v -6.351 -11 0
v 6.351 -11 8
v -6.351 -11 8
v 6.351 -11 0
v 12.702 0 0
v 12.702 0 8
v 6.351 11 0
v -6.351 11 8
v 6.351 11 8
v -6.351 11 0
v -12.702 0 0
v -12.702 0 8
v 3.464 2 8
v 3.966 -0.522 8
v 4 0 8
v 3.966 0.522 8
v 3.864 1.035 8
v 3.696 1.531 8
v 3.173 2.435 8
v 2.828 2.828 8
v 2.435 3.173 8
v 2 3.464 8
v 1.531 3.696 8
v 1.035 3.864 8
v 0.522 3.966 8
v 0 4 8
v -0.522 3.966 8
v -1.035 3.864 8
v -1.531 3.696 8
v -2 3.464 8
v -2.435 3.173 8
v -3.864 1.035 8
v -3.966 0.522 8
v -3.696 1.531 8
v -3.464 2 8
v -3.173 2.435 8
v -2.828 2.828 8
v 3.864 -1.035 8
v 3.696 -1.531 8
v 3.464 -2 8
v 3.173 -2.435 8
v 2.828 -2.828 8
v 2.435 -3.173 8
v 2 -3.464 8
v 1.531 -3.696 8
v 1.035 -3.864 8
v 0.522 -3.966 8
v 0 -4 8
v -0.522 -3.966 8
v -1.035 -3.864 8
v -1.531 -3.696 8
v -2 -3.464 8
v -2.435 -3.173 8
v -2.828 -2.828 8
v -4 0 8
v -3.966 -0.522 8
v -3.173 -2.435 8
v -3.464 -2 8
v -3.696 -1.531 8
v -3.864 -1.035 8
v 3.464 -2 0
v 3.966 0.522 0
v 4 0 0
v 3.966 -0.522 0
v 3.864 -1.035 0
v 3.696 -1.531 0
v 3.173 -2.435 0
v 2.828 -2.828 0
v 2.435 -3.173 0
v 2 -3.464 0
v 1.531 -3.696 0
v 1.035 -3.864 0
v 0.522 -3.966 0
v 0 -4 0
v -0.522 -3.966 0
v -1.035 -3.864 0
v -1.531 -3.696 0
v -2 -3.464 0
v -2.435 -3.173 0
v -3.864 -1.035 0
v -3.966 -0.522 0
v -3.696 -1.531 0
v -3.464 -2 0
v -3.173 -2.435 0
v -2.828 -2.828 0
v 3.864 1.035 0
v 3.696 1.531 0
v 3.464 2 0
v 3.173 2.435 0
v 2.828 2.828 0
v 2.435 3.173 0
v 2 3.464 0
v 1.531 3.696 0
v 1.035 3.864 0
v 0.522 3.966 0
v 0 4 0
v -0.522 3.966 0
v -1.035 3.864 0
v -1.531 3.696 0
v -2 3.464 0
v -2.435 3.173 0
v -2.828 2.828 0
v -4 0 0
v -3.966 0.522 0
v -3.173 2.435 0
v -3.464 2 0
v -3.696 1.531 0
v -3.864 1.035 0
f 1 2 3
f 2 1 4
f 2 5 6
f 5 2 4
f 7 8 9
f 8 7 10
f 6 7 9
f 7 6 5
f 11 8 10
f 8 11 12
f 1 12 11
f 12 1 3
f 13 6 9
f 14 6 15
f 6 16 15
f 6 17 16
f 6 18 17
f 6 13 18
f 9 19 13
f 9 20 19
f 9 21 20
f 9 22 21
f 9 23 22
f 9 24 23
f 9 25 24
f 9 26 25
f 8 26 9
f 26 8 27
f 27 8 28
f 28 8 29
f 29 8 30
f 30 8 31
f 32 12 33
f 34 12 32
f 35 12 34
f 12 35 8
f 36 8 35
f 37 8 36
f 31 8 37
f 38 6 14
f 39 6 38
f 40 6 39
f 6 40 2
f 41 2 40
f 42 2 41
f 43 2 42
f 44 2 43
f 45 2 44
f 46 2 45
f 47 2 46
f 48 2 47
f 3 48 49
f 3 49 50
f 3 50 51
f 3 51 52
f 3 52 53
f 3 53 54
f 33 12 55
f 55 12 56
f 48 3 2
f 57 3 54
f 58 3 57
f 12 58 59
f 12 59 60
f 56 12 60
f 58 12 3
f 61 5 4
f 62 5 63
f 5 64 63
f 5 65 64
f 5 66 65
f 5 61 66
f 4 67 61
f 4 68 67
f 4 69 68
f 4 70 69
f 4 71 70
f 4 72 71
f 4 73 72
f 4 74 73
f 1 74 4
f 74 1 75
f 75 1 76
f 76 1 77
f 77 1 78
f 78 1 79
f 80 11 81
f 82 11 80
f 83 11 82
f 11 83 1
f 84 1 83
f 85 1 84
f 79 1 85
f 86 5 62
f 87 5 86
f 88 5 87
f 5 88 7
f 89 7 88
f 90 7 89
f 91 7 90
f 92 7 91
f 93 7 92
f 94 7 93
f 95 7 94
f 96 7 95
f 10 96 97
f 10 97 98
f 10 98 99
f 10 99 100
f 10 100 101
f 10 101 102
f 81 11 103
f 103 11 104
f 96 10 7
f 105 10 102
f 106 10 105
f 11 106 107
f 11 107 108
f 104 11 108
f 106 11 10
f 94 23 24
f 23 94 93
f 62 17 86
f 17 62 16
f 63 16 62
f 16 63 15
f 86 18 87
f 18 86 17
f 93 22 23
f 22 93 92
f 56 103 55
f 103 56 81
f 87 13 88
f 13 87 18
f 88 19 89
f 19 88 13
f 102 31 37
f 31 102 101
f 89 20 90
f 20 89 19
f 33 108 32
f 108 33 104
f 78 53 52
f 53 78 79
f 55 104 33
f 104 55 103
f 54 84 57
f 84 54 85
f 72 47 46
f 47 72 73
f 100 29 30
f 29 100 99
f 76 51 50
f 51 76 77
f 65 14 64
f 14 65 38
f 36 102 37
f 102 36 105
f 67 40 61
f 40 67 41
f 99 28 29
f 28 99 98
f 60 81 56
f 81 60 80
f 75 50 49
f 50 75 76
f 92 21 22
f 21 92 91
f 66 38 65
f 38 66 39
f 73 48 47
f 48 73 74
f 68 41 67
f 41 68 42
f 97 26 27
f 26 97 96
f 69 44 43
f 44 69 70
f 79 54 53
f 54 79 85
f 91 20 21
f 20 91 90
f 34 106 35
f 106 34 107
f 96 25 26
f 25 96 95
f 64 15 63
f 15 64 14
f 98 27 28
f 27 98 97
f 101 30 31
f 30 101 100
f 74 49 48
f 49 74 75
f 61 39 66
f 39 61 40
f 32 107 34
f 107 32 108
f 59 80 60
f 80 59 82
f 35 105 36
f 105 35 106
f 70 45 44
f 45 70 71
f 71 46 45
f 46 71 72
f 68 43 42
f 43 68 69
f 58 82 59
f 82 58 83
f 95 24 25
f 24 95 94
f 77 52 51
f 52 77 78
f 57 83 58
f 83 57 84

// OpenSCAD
// Starter hex nut for task-018.
$fn = 48;

across_flats = 22;
nut_height = 8;
hole_diameter = 8;

difference() {
  cylinder($fn = 6, h = nut_height, r = across_flats / sqrt(3));
  translate([0, 0, -1])
    cylinder(h = nut_height + 2, r = hole_diameter / 2);
}
